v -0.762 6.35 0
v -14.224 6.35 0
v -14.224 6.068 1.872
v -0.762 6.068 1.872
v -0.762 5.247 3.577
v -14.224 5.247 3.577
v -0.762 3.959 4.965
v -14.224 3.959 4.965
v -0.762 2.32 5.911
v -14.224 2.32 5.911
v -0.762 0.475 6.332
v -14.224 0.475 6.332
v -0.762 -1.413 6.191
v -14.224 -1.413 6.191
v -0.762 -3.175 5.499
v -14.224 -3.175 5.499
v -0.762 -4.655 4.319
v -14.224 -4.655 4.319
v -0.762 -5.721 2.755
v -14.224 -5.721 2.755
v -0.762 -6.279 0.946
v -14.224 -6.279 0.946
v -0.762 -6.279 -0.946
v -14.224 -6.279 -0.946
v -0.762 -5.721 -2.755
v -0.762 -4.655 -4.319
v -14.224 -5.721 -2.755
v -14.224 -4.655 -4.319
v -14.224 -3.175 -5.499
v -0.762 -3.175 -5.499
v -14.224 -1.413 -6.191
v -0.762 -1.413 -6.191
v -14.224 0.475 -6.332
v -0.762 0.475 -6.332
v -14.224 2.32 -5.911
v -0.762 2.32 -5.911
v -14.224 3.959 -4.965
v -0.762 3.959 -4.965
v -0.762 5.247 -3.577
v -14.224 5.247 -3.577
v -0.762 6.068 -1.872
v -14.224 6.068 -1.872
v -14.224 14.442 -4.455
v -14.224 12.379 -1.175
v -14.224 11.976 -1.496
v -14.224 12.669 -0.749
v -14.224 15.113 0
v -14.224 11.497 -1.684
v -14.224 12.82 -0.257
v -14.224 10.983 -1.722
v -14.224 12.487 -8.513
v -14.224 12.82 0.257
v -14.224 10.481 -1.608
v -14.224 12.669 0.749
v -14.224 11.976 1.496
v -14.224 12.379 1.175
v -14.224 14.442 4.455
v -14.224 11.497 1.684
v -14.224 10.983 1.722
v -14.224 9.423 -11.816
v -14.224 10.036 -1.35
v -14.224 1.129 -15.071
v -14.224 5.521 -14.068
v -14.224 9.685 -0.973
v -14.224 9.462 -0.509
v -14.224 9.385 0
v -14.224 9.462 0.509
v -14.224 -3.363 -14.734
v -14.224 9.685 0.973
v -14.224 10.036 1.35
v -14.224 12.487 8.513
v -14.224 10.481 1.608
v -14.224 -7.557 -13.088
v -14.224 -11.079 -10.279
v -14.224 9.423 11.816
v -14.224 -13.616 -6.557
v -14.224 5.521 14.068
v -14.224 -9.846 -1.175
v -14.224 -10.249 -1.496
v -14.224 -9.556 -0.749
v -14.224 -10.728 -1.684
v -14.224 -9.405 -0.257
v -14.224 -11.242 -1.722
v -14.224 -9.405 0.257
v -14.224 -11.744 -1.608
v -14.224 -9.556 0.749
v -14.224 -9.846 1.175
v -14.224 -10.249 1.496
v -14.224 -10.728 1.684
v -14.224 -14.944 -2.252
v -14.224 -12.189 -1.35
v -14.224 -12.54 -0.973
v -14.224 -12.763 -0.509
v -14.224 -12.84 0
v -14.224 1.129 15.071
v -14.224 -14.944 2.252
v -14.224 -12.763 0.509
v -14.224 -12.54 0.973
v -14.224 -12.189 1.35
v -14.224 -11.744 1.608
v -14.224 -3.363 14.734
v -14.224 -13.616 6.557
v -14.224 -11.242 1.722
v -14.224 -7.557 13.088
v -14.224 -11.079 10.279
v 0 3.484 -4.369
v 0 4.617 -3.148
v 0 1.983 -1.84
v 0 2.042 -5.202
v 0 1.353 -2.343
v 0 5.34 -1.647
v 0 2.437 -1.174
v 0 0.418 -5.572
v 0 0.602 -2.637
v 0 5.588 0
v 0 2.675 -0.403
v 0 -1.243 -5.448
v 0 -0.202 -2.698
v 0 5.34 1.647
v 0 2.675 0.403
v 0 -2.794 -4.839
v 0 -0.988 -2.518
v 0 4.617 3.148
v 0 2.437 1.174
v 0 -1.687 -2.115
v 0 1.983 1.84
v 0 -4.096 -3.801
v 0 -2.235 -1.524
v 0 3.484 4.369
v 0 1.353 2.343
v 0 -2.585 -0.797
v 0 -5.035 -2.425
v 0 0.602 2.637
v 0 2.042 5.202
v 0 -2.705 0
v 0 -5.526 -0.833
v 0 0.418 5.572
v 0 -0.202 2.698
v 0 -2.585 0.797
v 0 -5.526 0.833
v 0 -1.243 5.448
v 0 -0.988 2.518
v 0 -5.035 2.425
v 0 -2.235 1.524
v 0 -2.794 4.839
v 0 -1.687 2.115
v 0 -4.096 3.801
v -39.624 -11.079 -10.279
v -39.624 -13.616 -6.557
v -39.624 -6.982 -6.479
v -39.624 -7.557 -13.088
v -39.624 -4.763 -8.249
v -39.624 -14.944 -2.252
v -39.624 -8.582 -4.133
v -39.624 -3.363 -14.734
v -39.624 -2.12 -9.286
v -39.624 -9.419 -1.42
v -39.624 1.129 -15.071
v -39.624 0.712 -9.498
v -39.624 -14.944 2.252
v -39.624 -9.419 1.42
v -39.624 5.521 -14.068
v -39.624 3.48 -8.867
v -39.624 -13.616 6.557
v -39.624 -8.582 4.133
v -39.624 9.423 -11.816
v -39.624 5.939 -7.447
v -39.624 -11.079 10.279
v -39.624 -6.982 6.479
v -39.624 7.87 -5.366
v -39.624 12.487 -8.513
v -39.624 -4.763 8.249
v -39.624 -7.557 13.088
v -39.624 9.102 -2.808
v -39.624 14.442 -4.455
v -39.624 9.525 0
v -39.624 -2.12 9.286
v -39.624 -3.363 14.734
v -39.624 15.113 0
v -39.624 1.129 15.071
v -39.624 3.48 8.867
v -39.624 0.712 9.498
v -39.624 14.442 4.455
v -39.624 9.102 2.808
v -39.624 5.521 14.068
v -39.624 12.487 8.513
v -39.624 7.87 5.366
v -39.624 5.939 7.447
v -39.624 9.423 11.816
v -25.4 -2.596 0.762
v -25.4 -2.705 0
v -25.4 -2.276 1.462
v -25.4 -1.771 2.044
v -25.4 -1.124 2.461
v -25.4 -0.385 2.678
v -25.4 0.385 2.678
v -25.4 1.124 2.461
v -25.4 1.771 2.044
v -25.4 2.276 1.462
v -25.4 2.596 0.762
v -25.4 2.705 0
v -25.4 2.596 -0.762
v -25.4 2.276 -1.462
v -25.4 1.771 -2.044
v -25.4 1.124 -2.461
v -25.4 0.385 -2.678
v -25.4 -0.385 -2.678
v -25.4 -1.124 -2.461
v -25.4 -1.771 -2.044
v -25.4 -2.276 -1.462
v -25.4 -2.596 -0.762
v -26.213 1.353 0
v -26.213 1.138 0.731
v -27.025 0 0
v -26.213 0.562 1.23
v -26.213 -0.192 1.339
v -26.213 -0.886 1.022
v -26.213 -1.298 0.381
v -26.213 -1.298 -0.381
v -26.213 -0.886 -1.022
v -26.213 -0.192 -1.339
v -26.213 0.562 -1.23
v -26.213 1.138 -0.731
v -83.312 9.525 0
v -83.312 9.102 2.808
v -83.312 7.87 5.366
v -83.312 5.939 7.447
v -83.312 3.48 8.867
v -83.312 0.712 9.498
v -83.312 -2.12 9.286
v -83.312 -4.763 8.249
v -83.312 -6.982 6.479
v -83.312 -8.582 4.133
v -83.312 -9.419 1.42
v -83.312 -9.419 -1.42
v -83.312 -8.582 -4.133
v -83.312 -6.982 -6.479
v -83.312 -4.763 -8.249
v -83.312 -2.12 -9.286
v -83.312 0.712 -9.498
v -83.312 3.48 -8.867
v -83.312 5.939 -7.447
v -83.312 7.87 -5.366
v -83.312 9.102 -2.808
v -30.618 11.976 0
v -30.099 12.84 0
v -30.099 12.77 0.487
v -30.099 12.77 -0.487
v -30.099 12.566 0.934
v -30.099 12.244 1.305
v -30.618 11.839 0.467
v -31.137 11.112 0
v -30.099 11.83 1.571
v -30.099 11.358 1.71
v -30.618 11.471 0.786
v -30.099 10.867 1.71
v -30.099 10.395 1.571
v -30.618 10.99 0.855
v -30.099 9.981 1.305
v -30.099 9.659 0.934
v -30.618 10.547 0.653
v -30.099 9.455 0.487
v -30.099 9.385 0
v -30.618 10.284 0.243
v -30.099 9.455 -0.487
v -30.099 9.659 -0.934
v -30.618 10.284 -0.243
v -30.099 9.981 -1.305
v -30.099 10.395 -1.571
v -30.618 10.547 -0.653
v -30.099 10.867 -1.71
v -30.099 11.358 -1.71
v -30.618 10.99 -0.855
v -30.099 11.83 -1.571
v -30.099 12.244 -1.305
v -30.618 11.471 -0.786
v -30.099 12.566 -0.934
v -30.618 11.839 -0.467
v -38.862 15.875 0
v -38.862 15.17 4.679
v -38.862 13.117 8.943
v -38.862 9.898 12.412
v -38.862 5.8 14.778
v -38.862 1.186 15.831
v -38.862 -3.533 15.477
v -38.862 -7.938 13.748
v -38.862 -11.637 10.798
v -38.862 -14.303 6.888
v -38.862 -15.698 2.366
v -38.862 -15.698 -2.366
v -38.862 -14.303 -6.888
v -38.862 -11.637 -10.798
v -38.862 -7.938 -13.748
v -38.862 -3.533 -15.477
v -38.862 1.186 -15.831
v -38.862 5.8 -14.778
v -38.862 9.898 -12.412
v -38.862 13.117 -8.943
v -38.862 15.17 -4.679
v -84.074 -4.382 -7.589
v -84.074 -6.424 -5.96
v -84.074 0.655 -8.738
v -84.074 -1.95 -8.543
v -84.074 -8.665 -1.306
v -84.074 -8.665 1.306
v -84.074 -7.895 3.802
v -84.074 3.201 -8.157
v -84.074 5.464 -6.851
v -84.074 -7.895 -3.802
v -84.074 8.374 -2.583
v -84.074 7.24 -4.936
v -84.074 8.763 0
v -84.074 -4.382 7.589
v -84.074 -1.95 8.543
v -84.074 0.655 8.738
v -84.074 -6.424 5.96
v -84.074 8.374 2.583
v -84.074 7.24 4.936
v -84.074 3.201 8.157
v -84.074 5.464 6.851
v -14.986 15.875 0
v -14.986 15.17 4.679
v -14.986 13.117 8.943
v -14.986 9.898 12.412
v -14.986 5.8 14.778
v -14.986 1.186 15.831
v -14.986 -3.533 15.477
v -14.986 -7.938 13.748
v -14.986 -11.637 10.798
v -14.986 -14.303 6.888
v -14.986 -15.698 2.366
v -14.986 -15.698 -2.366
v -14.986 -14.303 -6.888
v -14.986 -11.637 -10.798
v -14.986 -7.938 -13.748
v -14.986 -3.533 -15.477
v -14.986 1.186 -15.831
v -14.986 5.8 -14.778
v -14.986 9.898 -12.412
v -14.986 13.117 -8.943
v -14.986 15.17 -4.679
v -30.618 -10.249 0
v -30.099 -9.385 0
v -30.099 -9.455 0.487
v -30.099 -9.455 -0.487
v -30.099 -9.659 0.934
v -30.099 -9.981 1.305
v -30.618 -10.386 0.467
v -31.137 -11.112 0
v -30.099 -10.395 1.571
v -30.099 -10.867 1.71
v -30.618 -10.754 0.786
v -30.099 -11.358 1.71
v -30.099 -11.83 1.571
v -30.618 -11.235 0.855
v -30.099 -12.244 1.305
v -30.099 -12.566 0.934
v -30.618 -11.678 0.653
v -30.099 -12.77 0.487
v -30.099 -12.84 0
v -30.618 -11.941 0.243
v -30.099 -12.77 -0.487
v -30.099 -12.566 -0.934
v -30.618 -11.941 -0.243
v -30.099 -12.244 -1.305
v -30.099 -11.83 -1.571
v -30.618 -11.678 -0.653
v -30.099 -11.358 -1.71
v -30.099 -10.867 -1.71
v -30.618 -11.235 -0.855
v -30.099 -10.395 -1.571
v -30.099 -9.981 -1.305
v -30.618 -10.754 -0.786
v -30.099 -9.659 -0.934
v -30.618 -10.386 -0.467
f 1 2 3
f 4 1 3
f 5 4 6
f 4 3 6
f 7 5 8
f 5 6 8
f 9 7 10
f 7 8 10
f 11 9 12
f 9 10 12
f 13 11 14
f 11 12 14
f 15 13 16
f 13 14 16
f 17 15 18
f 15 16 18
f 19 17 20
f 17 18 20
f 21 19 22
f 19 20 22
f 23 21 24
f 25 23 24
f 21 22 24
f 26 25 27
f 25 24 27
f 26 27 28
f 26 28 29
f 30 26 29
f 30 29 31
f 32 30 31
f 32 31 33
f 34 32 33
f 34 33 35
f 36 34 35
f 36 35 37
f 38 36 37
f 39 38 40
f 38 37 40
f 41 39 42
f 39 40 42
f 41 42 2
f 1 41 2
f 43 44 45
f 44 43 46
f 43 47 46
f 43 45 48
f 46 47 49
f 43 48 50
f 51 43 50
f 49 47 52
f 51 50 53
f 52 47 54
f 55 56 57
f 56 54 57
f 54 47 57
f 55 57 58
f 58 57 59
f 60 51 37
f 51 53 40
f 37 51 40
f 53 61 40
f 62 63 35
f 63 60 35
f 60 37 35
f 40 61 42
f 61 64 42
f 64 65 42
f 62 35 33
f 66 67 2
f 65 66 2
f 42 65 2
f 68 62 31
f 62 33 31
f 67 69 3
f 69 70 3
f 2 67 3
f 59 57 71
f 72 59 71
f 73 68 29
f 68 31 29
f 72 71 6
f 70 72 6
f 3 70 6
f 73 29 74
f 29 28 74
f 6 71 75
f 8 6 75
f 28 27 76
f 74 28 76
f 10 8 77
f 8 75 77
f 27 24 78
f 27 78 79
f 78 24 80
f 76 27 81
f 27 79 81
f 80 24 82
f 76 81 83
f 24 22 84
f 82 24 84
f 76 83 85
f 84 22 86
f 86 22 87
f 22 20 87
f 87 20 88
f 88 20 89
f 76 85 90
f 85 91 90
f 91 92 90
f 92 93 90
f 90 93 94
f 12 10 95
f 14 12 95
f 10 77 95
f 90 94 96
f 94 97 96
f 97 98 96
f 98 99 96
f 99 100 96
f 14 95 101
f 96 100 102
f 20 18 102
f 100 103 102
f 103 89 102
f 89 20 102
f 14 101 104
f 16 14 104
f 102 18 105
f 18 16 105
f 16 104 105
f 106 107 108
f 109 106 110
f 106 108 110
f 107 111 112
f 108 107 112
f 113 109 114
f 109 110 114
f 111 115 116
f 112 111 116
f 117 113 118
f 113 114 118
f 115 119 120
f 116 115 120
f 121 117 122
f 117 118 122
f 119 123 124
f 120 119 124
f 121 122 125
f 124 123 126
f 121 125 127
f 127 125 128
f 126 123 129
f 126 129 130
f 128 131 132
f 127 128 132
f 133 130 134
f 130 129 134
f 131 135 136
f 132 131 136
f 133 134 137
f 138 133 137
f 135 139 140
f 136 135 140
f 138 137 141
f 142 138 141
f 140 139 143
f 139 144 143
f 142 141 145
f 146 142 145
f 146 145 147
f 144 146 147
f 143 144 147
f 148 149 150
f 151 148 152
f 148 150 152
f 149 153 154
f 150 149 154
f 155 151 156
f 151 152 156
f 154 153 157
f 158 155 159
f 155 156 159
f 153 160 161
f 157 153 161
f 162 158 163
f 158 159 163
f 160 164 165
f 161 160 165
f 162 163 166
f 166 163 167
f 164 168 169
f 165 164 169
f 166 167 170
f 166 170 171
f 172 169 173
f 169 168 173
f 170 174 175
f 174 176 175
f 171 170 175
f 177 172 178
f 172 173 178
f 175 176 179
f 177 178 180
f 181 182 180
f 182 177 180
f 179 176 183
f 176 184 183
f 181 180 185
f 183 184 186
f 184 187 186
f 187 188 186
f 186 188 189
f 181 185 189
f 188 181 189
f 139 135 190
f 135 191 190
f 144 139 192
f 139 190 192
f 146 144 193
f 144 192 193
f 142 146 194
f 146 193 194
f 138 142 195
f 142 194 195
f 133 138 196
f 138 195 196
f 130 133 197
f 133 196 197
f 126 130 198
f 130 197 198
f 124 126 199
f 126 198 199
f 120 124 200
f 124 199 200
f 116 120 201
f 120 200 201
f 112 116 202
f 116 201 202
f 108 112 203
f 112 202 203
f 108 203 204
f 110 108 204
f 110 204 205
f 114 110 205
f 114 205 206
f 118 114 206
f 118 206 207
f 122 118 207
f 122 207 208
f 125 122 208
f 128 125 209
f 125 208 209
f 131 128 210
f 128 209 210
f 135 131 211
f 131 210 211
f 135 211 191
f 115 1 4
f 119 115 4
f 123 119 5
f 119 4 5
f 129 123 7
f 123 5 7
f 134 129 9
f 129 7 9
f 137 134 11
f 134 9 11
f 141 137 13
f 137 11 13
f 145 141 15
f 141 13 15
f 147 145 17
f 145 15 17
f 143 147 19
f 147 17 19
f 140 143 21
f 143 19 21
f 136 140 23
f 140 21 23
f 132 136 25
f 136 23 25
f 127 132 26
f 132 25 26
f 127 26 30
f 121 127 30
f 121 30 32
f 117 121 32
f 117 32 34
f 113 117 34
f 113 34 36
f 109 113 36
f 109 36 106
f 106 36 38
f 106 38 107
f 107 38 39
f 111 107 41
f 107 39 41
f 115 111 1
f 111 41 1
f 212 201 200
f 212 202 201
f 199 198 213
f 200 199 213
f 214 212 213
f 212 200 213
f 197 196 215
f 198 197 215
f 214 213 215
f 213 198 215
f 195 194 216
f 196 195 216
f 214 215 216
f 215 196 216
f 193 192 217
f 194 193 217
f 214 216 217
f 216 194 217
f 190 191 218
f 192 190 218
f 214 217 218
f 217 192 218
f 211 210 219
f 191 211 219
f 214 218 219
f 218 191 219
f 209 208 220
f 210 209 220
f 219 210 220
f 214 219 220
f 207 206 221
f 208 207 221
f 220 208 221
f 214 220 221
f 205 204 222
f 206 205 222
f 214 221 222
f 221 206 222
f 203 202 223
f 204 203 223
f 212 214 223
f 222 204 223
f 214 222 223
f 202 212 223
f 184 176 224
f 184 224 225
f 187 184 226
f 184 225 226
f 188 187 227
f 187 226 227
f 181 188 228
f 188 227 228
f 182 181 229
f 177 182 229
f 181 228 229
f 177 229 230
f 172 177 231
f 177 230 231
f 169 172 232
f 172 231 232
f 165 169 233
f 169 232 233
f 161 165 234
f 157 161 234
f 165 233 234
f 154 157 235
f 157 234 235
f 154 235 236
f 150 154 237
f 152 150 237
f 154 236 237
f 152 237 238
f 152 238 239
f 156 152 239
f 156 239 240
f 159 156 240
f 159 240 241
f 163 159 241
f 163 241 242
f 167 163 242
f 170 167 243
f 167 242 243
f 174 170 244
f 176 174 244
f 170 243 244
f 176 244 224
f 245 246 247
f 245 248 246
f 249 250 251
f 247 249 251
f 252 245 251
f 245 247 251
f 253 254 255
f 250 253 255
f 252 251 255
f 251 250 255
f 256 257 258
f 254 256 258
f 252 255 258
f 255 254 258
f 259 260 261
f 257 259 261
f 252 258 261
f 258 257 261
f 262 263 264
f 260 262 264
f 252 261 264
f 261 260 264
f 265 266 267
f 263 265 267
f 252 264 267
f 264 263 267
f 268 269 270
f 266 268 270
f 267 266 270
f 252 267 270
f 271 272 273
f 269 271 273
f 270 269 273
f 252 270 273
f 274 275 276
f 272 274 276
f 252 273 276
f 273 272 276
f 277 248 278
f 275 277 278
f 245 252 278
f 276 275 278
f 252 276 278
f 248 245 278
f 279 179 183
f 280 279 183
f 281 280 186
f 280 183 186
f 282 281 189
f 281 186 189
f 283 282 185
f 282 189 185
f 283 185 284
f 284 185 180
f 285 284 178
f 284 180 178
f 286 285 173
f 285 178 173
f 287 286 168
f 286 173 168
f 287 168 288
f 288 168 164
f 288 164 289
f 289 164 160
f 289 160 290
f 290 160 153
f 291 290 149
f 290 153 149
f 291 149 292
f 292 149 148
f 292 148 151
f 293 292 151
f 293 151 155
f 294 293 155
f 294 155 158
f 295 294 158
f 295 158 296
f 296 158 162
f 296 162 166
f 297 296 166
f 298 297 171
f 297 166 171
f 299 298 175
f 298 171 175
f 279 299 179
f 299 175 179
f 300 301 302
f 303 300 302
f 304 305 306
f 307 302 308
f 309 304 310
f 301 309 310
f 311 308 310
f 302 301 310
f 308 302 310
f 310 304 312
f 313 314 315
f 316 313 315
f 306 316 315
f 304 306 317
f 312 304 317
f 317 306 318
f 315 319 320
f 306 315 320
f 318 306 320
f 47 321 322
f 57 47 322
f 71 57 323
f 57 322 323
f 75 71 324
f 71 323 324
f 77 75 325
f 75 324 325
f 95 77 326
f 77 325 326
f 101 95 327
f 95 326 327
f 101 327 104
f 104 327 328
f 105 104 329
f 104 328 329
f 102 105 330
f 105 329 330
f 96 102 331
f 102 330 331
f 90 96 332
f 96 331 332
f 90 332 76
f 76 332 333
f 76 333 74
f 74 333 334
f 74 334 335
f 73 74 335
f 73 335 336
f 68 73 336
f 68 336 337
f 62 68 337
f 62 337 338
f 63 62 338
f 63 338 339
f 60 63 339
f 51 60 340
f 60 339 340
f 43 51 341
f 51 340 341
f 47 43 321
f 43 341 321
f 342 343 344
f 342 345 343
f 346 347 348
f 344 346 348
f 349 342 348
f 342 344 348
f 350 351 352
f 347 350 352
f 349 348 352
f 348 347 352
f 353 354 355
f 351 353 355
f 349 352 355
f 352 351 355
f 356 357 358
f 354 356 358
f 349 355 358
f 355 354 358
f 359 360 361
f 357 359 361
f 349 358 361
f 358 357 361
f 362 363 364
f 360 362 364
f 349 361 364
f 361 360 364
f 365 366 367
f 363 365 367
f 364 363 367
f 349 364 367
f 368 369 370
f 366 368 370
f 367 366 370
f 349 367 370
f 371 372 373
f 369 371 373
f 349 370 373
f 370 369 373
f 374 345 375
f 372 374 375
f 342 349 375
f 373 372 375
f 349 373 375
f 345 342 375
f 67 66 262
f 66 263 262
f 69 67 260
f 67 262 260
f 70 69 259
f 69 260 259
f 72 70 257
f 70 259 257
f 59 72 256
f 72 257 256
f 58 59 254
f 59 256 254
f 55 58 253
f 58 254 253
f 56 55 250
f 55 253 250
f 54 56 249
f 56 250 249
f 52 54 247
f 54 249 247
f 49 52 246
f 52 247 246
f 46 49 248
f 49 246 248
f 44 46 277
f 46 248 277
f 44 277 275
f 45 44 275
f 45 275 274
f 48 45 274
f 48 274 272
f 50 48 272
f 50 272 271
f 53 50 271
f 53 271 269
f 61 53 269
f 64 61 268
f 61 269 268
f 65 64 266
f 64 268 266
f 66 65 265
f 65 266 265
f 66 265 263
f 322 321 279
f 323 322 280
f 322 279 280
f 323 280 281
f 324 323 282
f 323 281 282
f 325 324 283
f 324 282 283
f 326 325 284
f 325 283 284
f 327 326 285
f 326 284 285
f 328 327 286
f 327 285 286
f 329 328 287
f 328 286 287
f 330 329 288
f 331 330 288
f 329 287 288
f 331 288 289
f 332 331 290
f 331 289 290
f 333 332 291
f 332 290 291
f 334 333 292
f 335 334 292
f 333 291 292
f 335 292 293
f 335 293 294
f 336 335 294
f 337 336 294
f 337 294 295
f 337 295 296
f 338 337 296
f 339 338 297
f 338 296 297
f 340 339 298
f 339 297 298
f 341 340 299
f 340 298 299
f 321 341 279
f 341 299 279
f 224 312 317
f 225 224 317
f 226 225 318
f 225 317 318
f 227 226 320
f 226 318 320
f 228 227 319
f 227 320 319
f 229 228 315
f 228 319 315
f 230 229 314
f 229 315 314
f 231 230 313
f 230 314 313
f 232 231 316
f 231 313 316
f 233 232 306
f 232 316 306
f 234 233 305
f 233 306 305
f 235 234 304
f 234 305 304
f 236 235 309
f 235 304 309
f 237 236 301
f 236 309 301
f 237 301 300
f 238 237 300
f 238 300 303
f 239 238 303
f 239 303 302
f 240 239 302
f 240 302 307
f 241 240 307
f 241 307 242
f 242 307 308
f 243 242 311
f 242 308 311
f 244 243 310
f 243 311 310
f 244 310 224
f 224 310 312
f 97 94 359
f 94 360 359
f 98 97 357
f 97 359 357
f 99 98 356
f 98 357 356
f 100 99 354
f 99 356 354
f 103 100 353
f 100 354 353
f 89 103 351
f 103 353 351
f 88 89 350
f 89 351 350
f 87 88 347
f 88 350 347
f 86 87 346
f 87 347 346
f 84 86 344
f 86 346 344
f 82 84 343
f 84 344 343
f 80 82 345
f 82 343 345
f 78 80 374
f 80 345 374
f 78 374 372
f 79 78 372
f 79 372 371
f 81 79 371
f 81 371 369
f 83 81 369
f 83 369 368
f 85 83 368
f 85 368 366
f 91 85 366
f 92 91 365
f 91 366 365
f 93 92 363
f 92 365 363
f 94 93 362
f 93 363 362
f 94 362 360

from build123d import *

# Parameters (mm, degrees)
F3_D     = 5.4102
F3_DEPTH = 25.4
F3_TIP   = 1.6253880605
F5_D     = 3.4544
F5_DEPTH = 15.875
F5_TIP   = 1.0378064612
F6_SIZE  = 0.762


with BuildPart() as f1:
    # F0 (on Top) → F1 (revolve)
    with BuildSketch(Plane.XY):
        Polygon((-84.074, 0), (0, 0), (0, 6.35), (-14.224, 6.35), (-14.224, 15.875), (-39.624, 15.875), (-39.624, 9.525), (-84.074, 9.525), align=None)
    revolve(axis=Axis((-42.037, 0, 0), (1, 0, 0)))

    # F3
    with Locations(Plane.YZ):
        with Locations((0, 0)):
            Hole(F3_D / 2, depth=F3_DEPTH)
            with Locations((0, 0, -(F3_DEPTH + F3_TIP / 2))):  # 118° drill point
                Cone(0, F3_D / 2, F3_TIP, mode=Mode.SUBTRACT)

    # F5
    with Locations(Plane.YZ.offset(-14.224)):
        with Locations((-11.1125, 0), (11.1125, 0)):
            Hole(F5_D / 2, depth=F5_DEPTH)
            with Locations((0, 0, -(F5_DEPTH + F5_TIP / 2))):  # 118° drill point
                Cone(0, F5_D / 2, F5_TIP, mode=Mode.SUBTRACT)

    # F6
    f6_edges = [f1.edges().sort_by_distance(p)[0] for p in [
        (0, -6.35, 0),
        (-14.224, -15.875, 0),
        (-39.624, -15.875, 0),
        (-84.074, -9.525, 0),
    ]]
    chamfer(f6_edges, length=F6_SIZE)


solid = f1.part
